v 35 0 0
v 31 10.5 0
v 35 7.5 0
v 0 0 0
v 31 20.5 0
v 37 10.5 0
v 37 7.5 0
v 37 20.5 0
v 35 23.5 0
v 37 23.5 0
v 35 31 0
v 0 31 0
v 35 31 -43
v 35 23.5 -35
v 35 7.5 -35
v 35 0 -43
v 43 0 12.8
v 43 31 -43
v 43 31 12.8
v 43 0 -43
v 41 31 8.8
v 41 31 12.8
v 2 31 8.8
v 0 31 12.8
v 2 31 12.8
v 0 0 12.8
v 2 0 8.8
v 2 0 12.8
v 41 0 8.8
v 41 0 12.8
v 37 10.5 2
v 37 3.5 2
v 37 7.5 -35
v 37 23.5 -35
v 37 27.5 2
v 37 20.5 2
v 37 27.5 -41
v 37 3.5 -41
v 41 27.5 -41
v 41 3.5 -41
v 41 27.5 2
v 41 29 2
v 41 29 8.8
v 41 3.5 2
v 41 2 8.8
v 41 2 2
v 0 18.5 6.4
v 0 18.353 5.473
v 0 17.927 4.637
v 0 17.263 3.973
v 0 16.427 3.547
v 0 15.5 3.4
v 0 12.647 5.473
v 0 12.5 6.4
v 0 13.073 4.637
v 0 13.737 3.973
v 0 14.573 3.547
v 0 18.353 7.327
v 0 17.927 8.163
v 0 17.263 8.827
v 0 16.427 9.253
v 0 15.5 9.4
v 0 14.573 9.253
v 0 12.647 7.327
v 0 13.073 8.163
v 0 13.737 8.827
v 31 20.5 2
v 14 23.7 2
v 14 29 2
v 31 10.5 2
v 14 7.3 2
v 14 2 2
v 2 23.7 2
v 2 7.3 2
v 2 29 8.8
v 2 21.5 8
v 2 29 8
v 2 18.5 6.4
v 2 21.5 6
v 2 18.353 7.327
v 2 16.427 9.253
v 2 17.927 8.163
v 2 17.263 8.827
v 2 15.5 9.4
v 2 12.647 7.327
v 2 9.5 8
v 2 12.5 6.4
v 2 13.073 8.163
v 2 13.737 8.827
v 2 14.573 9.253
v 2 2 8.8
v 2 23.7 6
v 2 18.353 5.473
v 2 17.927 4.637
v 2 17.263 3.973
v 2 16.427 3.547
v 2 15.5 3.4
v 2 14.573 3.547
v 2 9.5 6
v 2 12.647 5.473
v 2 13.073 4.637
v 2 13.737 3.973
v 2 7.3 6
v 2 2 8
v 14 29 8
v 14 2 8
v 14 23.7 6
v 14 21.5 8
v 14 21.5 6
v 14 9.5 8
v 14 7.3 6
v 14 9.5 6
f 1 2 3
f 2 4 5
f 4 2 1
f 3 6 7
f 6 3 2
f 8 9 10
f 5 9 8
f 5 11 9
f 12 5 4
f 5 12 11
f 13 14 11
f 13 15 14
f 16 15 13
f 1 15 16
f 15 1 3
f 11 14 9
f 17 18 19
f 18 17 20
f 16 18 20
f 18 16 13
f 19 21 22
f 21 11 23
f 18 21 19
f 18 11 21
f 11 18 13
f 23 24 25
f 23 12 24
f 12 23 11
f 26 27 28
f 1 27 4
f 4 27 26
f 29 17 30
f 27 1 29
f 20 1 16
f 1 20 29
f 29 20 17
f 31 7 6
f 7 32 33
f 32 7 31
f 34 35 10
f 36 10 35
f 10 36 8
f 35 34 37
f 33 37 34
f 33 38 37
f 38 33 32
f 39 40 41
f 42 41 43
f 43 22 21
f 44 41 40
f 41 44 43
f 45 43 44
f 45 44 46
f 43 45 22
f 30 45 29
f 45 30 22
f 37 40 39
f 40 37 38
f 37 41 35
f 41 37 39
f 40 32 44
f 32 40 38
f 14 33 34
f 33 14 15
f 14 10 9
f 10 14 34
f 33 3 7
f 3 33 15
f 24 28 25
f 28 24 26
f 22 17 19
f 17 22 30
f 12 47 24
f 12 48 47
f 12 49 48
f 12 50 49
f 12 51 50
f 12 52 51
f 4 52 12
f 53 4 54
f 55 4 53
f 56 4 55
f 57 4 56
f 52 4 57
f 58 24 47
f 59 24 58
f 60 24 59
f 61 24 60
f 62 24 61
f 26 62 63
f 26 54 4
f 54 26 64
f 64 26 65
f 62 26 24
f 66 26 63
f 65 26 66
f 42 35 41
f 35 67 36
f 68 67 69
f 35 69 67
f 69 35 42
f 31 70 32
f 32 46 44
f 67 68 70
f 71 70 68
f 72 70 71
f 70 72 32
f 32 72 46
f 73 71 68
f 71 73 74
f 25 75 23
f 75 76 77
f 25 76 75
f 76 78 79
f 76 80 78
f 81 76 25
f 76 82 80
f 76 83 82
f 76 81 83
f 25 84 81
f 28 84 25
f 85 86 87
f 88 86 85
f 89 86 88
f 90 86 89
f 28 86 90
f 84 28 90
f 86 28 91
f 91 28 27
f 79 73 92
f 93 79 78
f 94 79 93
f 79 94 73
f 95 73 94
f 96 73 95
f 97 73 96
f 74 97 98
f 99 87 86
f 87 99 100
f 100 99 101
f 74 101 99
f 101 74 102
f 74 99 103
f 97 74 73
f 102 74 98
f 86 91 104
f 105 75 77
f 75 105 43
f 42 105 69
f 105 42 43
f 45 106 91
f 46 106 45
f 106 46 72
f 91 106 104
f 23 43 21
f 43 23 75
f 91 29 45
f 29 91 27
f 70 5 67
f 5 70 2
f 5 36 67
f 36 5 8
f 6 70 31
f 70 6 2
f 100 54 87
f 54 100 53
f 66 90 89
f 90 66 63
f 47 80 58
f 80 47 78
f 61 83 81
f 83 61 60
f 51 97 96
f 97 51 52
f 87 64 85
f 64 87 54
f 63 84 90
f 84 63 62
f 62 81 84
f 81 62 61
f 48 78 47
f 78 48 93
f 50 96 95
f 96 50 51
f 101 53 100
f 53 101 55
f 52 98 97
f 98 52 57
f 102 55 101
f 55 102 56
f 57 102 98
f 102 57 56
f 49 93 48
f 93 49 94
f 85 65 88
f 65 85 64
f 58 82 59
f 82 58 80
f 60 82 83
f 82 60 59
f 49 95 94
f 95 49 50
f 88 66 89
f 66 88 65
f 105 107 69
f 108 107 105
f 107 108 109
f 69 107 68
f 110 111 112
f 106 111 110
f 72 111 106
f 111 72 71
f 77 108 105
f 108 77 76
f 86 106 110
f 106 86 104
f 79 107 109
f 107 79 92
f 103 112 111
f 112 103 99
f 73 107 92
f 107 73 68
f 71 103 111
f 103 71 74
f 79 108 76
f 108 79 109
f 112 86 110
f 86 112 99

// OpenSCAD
depth=43;
width=31;
height=12.8;
bottom_height=18;
wallEdge=2;
inner_width = width - wallEdge * 2;
inner_depth=depth - wallEdge * 2;

module top_box() {
    difference() {
        cube([depth, width, height]);
        translate([wallEdge, wallEdge, wallEdge]) {
            cube([inner_depth, inner_width, height]);
        }
        translate([wallEdge, 0, height - wallEdge * 2]) {
            cube([inner_depth, width, wallEdge*2]);
        }
    }
}

module temp_attachment() {
    inner_width=24;
    dht_width=16;
    width_edge=(width - inner_width) / 2;
    dht_width_edge=(width - dht_width) / 2;
    height=6;
    backing=2;
    inner_height=height - 2;
      translate([depth,0,-depth]) {
          rotate([0,-90,0]) {
             mirror([0, 0, 0]) {
                difference() {
                    cube([depth, width,height + backing]);
                    translate([wallEdge, width_edge, backing]) {
                        cube([depth, inner_width,inner_height]);
                    }
                    translate([wallEdge + 6, dht_width_edge, backing]) {
                        cube([depth, dht_width,inner_height + 5]);
                    }
                }
            }
        }
    }
}


temp_attachment();

module led_placeholder() {
    translate([-2, width/2 ,6.4]) {
        rotate([0,90,0]) {
            cylinder(d=6, h=10, $fn=20);
        }
    }
}

module wire_channel() {
    channel_width=10;
    channel_width_edge=(width - channel_width) / 2;
    channel_width_2=24;
    channel_width_edge_2=(width - channel_width_2) / 2;
    translate([depth - 12,channel_width_edge,0]) {
        cube([10, channel_width, 8]);
    }
    translate([depth - 6,channel_width_edge_2,0]) {
        cube([4, channel_width_2, 8]);
    }
}

difference() {
    top_box();
    led_placeholder(); 
    wire_channel();
}

module inside_box() {
    translate([wallEdge, wallEdge, wallEdge]) {
        // LED holder
        inset=5.3;
        inset2=7.5;
        depth=12;
        height=6;
        difference() {
            cube([depth, inner_width, height]);
            translate([0, inset, 0]) {
                cube([depth + 1, inner_width - inset * 2, 4]);
            }
            translate([0, inset2, 0]) {
                cube([depth + 1, inner_width - inset2 * 2, 7]);
            }
        }
    }
}
inside_box();

module wedge() {
    height=9;
    in=0.925;
    width=2.5;

    points=[
        [0, 0, 0], // back left bottom
        [0, width, 0], // back right bottom
        [0, width, height], // back right top
        [0, 0, height], // back left top
    
        [in, 0, 0], // front left bottom
        [in, width, 0], // front right bottom
    ];
    faces=[
        [0, 1, 2, 3], // back
        [3, 4, 0], // left
        [3, 2, 5, 4], // front
        [2, 1, 5], // right
        [0, 4, 5, 1], // bottom
    ];
    polyhedron(points, faces);
}

module bottom_box() {
    cutaway_amount=wallEdge * 1.25;
    difference() {
        translate([depth - 5.5,wallEdge * 1.5,bottom_height]) {
            cube([3, inner_width - (wallEdge), wallEdge * 2]);
        }
        translate([depth - 5.5,9,bottom_height]) {
           cube([3, 13, wallEdge * 2]);
        }
    }
    difference() {
        cube([depth, width, bottom_height]);
        translate([wallEdge, wallEdge, wallEdge]) {
            inset=7;
            cube([inner_depth - 3.5, inner_width, bottom_height]);
            translate([0, inset, 0]) {
                cube([inner_depth, inner_width - (inset * 2), bottom_height]);
            }
        }
        translate([0, 0, bottom_height - wallEdge * 2]) {
            cube([cutaway_amount, width, wallEdge * 2]);
        }

        translate([depth - cutaway_amount, 0, bottom_height - wallEdge * 2]) {
            cube([cutaway_amount, width, wallEdge * 2]);
        }
        translate([depth - 8, 10, wallEdge - 1]) {
            cube([8, width - 20, wallEdge * 3.5]);
        }
    }
}

module wedges_on_edge() {
    wedge_indentation=3;
    esp32_gap=3;
    wedge_width=2.5;
    translate([0, wedge_indentation, esp32_gap]) {
        wedge();
    }
    translate([0, inner_width - wedge_indentation - wedge_width, esp32_gap]) {
        wedge();
    }
}
    
translate([0, 50, 0]) {
//    bottom_box();
    wedge_indentation = 3;
    esp32_gap=3;
    wedge_width=2.5;
    other_side_of_the_box=-35.5;

    translate([wallEdge, wallEdge, wallEdge]) {
        difference() {
//            wedges_on_edge();
            translate([0.3, 0, 1.4]) {
//                cube([5.5, inner_width, esp32_gap]);
            }
            translate([-2, 0, bottom_height - wallEdge * 3]) {
//                cube([5.5, inner_width, 5]);
            }
        }
//        cube([5.5, inner_width, esp32_gap]);
        mirror([1,0,0]) {
            translate([other_side_of_the_box, 0, 0]) {
                difference() {
//                    wedges_on_edge();
                    translate([0.3, 0, 1.4]) {
//                        cube([5.5, inner_width, esp32_gap]);
                    }
                }
                difference() {
//                    cube([1, inner_width, esp32_gap]);
                    space=7;
                    translate([0, space, 0]) {
//                        cube([1, inner_width - space * 2, esp32_gap]);
                    }
                }
            }
        }
    }
}
